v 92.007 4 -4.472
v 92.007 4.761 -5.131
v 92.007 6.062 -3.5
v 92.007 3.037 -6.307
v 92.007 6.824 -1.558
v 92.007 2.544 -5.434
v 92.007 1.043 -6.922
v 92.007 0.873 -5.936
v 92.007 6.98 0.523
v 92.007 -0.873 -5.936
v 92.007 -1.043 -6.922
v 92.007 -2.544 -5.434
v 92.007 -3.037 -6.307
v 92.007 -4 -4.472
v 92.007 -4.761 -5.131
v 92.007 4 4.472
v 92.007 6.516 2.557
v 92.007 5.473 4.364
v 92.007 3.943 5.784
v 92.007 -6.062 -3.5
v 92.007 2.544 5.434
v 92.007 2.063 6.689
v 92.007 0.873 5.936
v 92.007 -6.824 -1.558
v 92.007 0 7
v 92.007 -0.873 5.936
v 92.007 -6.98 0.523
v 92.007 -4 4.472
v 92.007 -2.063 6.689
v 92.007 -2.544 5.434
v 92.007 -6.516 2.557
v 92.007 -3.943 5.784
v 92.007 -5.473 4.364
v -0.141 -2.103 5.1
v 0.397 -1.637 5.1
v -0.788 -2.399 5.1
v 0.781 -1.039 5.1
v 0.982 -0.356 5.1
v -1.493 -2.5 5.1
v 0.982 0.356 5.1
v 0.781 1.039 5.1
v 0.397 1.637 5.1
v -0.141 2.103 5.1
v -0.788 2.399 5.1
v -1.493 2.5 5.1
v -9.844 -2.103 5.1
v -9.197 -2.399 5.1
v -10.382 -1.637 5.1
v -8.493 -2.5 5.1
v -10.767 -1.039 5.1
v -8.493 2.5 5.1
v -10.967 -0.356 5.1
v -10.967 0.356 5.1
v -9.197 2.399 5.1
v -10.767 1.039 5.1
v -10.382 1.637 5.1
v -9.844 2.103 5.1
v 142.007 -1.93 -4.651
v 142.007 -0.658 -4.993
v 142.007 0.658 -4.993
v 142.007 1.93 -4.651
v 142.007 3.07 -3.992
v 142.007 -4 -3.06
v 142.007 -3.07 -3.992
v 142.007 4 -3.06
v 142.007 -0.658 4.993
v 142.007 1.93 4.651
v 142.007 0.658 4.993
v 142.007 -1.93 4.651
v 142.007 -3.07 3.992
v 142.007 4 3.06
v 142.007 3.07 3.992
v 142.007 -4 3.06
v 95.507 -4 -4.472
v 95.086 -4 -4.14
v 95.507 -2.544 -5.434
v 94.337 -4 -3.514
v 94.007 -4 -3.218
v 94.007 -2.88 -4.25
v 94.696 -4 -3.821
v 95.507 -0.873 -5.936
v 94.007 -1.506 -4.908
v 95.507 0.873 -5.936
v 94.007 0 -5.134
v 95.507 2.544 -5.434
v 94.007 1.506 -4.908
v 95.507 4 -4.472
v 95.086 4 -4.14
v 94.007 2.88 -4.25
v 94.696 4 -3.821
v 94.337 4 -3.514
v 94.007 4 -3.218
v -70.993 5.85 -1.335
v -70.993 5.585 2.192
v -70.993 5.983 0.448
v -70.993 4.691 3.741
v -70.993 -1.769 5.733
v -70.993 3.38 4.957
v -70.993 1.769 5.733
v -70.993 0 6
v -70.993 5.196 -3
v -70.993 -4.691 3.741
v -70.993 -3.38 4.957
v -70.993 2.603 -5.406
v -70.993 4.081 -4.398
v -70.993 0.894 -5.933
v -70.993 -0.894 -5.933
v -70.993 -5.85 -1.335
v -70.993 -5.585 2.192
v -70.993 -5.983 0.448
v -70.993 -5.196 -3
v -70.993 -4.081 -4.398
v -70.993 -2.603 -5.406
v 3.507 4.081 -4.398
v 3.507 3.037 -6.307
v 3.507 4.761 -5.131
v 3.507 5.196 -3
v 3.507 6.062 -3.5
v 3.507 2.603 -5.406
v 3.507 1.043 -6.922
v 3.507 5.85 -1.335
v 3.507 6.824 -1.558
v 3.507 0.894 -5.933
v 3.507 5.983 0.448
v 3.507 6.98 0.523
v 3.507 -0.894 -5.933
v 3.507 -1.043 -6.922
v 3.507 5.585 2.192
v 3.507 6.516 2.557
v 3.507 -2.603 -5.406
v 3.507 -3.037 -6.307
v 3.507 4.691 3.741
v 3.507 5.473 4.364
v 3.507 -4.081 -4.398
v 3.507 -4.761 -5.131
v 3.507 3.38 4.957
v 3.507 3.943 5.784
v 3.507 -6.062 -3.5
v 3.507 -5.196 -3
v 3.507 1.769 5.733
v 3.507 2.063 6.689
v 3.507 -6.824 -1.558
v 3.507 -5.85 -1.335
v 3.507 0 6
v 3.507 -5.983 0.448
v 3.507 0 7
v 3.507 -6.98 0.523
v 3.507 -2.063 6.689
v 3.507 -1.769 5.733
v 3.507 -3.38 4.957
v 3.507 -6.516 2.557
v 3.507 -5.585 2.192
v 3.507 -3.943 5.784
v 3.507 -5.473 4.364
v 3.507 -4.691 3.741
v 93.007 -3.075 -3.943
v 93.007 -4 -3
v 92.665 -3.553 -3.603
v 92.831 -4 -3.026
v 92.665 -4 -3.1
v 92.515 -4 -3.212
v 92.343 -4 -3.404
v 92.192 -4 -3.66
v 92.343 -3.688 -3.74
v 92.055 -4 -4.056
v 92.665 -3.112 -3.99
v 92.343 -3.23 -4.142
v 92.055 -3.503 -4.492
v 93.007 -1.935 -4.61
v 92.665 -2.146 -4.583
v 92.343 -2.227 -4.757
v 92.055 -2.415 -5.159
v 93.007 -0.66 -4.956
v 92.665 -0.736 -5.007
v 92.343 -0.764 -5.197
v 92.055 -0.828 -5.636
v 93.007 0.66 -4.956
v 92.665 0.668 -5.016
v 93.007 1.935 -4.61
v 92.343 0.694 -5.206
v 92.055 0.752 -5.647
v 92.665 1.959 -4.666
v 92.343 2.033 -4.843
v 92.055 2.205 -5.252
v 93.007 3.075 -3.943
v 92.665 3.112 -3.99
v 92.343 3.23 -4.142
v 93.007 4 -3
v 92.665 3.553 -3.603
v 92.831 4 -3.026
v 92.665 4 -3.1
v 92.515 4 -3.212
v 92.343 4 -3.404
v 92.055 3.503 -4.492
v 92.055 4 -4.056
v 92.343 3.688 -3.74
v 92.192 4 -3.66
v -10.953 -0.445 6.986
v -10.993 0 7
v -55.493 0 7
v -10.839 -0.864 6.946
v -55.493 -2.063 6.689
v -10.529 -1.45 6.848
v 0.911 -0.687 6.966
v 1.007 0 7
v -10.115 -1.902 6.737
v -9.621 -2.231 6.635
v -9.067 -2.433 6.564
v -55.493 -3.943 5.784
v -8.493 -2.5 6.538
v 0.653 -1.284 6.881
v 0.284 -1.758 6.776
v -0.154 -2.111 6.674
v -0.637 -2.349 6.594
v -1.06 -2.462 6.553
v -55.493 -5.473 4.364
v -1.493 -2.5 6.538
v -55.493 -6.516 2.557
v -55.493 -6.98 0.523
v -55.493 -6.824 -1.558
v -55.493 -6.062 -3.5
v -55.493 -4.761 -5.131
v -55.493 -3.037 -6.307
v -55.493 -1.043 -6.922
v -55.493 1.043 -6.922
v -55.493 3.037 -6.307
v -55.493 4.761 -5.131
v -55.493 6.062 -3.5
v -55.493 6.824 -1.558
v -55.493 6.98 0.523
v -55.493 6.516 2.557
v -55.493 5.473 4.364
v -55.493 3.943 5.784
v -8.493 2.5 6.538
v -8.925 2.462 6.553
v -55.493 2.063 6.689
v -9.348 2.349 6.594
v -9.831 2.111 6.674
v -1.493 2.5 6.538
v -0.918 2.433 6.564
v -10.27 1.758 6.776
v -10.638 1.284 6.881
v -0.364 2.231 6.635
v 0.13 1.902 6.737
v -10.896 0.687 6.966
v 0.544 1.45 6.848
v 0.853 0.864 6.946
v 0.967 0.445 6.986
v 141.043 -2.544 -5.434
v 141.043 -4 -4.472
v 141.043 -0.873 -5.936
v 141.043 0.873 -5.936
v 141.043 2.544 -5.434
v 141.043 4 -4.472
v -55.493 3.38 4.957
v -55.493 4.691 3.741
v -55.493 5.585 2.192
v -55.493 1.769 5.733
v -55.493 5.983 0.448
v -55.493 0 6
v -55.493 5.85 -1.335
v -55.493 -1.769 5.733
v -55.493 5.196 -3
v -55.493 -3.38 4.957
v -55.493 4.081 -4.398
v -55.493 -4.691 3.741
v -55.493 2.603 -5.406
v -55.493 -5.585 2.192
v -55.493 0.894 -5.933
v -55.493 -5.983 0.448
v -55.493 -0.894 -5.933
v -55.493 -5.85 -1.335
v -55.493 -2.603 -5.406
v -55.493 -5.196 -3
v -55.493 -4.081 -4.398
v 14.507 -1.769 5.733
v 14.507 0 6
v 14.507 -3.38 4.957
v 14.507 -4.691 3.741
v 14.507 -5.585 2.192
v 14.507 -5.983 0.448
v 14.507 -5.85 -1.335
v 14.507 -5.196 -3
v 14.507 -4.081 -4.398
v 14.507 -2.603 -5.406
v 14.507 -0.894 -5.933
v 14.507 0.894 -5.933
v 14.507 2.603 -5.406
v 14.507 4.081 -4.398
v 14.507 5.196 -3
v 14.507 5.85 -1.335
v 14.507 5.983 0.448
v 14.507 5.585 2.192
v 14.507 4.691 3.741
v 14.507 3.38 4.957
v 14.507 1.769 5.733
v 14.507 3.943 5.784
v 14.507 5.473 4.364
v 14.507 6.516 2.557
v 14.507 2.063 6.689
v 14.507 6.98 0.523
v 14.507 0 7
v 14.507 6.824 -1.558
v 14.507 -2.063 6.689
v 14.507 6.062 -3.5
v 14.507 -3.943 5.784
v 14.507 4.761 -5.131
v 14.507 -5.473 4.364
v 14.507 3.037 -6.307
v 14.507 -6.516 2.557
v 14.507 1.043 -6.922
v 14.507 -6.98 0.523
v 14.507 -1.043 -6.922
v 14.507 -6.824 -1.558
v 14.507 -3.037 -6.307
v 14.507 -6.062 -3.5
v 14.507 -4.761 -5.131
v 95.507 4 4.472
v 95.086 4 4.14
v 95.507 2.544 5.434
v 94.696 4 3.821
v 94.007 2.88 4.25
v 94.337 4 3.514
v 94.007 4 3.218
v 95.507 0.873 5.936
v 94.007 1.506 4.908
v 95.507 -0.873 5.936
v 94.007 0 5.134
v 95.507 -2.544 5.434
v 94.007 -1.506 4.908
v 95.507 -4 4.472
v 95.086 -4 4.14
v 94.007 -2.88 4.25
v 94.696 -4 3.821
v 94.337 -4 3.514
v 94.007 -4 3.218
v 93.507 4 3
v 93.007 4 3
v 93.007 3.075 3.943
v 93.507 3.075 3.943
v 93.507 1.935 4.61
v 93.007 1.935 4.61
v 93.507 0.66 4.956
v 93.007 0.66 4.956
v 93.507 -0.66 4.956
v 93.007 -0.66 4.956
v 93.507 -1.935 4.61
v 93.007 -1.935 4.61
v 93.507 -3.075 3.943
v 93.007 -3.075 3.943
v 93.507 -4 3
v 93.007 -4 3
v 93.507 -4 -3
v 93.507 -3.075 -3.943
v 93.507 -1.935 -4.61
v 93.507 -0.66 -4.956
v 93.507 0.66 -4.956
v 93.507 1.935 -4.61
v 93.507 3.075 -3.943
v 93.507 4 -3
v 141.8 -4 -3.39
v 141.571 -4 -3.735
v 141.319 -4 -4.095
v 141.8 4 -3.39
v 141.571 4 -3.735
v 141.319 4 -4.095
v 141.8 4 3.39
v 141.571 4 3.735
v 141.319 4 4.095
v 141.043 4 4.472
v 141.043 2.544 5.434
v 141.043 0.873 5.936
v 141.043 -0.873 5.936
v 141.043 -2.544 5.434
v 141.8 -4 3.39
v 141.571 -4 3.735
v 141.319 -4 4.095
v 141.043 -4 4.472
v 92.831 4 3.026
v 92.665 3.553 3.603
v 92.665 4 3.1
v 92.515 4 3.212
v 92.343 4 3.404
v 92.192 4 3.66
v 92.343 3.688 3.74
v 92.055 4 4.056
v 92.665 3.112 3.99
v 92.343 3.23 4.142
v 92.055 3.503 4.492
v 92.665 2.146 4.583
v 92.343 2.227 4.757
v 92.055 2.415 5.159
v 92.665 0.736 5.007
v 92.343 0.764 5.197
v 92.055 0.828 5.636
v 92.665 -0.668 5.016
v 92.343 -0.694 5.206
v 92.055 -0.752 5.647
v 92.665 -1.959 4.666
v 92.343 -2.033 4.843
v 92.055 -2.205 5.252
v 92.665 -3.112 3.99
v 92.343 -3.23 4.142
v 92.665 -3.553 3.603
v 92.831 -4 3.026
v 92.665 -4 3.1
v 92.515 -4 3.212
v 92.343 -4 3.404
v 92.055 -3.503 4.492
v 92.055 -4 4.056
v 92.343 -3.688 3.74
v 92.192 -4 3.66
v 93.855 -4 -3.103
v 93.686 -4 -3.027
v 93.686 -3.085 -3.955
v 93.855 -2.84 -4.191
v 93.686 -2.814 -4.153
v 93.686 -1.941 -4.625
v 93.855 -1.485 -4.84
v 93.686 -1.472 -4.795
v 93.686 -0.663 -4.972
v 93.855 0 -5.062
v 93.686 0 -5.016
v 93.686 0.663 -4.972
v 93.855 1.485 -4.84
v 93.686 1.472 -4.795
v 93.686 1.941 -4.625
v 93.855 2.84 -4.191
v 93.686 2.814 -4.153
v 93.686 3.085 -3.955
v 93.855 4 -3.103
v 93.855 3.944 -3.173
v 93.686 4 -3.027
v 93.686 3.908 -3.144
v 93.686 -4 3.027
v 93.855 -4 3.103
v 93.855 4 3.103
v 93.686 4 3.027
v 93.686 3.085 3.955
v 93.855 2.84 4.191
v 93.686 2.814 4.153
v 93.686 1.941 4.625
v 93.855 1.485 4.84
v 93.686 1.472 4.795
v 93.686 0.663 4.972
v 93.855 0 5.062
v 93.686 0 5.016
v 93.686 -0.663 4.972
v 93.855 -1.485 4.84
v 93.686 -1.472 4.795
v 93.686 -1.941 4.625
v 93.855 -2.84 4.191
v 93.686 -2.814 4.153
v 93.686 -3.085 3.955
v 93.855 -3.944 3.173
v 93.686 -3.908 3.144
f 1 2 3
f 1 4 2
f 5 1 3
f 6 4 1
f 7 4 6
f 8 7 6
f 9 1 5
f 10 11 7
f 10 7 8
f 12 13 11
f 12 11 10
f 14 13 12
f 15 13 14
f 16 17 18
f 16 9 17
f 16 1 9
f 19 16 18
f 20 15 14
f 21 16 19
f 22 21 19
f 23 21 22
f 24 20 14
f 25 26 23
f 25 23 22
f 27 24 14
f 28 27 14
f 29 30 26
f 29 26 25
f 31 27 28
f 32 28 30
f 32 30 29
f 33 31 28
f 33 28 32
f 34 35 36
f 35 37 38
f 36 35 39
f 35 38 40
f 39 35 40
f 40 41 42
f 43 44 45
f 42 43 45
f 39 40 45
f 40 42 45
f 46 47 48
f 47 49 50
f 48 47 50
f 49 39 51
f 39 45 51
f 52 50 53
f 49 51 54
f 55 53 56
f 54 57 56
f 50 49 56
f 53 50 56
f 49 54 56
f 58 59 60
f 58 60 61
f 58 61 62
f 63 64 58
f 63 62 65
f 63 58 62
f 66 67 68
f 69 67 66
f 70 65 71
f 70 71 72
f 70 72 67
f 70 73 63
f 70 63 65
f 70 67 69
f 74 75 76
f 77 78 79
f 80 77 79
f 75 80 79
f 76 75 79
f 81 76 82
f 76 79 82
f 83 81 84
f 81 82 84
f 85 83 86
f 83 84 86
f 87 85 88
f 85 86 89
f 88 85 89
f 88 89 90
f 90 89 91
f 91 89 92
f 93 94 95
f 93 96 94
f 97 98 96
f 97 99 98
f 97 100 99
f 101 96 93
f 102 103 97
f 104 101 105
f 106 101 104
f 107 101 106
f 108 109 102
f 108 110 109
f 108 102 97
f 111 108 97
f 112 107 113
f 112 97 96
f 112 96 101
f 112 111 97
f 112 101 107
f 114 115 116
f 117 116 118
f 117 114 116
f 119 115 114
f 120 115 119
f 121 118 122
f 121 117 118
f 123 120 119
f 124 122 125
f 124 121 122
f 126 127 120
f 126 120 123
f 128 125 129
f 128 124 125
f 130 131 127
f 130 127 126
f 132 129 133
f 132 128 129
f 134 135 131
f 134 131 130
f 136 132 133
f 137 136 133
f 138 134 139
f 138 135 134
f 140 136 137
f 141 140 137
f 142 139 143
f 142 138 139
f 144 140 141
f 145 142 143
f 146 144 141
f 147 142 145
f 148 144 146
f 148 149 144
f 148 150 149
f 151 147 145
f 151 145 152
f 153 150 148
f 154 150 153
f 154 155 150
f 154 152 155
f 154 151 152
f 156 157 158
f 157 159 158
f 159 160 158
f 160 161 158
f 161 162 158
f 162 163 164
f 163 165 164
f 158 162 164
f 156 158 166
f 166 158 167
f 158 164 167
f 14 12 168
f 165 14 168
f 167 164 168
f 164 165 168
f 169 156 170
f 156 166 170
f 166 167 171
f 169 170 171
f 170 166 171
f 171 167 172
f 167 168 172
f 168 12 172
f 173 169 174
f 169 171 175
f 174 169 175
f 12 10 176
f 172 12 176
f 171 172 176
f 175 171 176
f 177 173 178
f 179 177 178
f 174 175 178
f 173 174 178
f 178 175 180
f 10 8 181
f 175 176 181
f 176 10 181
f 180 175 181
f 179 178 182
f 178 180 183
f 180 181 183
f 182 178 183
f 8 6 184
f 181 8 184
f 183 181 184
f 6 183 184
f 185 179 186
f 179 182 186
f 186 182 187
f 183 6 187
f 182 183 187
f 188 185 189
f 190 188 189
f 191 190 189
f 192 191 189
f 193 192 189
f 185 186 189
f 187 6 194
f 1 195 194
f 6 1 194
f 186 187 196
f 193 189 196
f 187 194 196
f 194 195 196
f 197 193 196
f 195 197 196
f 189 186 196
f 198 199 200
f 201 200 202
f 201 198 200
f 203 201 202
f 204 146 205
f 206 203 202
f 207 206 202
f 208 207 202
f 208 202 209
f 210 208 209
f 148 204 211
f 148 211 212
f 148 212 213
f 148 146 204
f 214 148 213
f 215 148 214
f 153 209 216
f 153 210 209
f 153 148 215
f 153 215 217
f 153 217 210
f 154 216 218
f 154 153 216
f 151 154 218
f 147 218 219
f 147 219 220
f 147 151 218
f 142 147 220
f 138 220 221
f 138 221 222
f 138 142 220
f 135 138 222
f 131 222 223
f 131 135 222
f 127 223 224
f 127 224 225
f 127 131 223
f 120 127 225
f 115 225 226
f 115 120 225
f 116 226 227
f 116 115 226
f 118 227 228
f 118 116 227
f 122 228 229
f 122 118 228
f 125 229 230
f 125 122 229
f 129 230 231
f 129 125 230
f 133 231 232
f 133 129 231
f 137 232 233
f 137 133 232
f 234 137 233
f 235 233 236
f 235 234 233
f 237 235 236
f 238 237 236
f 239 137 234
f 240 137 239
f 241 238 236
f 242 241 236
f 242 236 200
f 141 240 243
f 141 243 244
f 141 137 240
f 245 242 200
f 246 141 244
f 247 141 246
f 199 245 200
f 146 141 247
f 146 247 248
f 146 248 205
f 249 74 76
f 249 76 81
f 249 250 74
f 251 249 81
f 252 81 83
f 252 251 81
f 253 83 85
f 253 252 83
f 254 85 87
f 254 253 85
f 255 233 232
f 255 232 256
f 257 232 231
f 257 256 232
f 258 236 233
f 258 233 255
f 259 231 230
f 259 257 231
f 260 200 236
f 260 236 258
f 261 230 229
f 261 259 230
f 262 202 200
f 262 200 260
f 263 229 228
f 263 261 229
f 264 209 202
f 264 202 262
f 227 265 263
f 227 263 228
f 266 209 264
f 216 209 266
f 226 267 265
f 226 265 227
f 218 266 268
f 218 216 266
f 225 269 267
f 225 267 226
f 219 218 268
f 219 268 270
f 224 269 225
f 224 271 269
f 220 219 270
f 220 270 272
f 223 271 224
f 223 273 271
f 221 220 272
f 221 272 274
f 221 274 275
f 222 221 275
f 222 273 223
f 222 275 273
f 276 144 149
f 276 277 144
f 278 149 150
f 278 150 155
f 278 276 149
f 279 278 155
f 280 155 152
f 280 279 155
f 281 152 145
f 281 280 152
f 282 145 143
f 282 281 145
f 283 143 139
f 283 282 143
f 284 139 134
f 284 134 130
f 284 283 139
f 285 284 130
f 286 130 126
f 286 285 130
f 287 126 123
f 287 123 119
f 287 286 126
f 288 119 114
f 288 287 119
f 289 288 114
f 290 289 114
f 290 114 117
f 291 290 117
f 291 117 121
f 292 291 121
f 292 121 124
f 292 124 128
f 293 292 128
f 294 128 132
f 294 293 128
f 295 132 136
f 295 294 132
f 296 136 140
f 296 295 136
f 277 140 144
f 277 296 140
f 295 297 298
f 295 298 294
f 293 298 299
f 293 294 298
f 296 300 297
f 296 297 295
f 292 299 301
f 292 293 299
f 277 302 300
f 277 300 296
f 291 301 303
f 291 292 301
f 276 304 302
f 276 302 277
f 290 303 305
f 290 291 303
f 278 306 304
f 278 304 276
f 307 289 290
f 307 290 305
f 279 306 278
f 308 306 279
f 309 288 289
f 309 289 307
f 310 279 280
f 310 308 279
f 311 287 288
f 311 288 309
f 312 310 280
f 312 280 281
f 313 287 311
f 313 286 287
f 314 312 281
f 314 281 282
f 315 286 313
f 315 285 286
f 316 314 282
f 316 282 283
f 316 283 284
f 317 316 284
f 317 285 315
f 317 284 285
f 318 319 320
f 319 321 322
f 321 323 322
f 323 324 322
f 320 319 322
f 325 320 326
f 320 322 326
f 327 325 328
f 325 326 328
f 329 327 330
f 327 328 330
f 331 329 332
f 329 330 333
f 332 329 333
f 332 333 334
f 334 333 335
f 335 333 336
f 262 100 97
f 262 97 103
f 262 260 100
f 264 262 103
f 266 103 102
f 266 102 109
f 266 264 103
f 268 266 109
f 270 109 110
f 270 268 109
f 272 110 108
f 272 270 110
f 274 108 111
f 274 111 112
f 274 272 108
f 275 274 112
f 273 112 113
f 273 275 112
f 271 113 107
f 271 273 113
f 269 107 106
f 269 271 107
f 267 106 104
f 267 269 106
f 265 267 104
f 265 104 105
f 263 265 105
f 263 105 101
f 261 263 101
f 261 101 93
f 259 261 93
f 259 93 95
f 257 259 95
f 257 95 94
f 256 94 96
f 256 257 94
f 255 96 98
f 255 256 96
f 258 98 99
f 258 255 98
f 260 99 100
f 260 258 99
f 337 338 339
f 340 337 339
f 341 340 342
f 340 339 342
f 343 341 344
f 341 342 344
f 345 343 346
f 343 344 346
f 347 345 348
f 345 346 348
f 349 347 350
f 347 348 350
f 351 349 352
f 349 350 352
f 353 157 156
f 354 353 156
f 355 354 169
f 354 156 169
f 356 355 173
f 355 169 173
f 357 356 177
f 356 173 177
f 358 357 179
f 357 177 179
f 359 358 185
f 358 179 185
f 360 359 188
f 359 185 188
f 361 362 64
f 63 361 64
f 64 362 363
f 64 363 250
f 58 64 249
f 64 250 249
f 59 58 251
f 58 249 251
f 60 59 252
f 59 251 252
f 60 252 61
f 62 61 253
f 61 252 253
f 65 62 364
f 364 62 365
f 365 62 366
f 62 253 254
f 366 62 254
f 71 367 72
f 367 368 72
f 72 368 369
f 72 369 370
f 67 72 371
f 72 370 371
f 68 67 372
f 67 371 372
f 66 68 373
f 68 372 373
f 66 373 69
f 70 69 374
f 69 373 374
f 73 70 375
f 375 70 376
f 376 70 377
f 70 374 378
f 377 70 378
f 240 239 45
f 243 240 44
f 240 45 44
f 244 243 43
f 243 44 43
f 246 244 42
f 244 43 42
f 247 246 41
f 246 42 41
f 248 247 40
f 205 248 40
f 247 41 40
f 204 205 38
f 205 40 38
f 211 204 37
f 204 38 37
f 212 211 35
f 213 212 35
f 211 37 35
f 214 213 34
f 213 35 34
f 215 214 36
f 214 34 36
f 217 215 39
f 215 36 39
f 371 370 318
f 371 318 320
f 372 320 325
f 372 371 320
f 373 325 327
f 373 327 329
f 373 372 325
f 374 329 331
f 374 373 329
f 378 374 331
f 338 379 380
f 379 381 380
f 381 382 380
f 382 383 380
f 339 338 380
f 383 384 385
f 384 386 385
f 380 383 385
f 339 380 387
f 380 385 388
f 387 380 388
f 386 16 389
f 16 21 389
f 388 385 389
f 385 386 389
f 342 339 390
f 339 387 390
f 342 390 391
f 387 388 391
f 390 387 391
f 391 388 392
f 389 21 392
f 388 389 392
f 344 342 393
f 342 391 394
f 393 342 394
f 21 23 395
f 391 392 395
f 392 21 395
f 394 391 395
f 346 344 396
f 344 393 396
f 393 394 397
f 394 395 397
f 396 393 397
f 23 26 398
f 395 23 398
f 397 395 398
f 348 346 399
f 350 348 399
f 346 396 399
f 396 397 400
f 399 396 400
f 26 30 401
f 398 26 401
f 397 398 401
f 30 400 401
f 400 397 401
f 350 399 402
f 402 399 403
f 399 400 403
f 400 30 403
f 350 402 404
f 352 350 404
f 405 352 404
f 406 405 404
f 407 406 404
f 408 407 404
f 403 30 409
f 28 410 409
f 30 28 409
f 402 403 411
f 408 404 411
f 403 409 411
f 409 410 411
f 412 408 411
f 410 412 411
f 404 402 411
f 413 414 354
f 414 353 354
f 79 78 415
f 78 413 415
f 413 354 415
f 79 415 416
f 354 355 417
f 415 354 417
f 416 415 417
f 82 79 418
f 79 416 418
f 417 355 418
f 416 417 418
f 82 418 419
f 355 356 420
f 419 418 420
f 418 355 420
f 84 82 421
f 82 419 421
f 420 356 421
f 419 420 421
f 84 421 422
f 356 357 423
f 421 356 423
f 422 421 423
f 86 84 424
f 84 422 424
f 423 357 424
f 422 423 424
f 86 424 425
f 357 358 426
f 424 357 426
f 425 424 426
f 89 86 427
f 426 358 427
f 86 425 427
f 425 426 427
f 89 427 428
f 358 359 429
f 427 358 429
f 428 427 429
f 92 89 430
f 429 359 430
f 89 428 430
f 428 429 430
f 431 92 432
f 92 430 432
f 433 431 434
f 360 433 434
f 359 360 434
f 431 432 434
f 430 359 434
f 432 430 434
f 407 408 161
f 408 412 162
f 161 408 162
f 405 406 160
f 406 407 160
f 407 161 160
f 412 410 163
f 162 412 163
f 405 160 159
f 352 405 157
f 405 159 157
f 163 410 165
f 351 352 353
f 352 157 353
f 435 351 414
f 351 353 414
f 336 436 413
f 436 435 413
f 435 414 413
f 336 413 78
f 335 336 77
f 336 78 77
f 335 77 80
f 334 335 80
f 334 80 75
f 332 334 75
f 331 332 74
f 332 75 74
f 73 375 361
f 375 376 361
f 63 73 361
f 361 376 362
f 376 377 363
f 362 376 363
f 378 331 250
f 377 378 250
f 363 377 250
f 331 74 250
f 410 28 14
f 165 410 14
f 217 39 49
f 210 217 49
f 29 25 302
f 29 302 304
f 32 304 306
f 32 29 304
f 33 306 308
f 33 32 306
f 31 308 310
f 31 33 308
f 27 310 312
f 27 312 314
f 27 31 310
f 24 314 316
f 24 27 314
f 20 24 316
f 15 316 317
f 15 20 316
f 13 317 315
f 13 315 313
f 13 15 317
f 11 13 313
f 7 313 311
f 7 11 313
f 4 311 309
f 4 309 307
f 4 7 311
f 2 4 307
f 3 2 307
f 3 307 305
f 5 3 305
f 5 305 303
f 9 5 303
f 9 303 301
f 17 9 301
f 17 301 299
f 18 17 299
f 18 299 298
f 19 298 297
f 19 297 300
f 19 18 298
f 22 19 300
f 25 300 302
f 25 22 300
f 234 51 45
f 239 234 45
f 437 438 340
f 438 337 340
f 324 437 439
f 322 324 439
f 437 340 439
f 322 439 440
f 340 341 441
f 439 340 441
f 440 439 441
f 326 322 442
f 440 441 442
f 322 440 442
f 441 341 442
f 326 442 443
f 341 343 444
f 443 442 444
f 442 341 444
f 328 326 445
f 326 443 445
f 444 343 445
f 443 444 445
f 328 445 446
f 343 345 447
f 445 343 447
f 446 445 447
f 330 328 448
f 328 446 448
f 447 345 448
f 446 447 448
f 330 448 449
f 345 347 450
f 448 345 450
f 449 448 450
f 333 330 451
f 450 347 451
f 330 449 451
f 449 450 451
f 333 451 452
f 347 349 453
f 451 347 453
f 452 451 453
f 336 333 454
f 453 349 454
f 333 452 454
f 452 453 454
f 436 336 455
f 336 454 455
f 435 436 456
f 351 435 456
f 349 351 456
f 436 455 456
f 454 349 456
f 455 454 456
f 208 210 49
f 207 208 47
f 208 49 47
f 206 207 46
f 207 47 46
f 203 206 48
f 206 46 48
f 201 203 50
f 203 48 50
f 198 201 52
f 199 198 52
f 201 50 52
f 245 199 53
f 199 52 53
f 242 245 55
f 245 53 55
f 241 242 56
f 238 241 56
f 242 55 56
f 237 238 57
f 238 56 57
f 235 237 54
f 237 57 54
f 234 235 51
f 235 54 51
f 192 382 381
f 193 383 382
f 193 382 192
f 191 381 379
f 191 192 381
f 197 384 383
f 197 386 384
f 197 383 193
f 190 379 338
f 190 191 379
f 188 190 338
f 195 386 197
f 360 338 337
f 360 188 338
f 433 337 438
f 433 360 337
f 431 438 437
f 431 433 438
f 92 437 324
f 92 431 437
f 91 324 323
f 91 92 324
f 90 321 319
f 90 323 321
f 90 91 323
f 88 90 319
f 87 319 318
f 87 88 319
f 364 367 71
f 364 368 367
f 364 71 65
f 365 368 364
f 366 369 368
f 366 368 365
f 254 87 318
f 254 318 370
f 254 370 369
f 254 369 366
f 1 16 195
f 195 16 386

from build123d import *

# Parameters (mm, degrees)
SCHNITT_LINEAR_AUSTRAGEN1_DEPTH      = 143.352054199
SCHNITT_LINEAR_AUSTRAGEN1_DEPTH_BACK = 143.352054199
SKIZZE4_W                            = 80.01116069
SKIZZE4_H                            = 4.996766738
SCHNITT_LINEAR_AUSTRAGEN2_DEPTH      = 143.867446828
SCHNITT_LINEAR_AUSTRAGEN2_DEPTH_BACK = 1.9


# Read off the part's stored shape, not the designer's step: M12 Maschinengewinde Bolzen1
with BuildPart() as part:
    # Skizze2 → Rotation1 (revolve)
    with BuildSketch(Plane.XY, mode=Mode.PRIVATE) as rotation1_sk:
        Polygon((-70.992580001, 0), (-70.992580001, 6), (-55.492580001, 6), (-55.492580001, 7), (3.507419999, 7), (3.507419999, 6), (14.507419999, 6), (14.507419999, 7), (92.007419999, 7), (92.007419999, 6), (142.007419999, 6), (142.007419999, 0), align=None)
    revolve(rotation1_sk.sketch.rotate(Axis((-31.289719626, 0, 0), (1, 0, 0)), 90), axis=Axis((-31.289719626, 0, 0), (1, 0, 0)))

    # M12 Maschinengewinde Bolzen1 outline → M12 Maschinengewinde Bolzen1 (revolve, cut)
    with BuildSketch(Plane.YX):
        with BuildLine():
            Line((6, 95.507419999), (5.133974596, 94.007419999))
            ThreePointArc((5.133974596, 94.007419999), (5.034074174, 93.766239044), (5, 93.507419999))
            Line((5, 93.507419999), (5, 93.007419999))
            ThreePointArc((5, 93.007419999), (5.292893219, 92.300313218), (6, 92.007419999))
            Line((6, 92.007419999), (6, 95.507419999))
        make_face()
        Polygon((5.036, 142.007419999), (6, 141.043419999), (6, 142.007419999), align=None)
    revolve(axis=Axis((0, 0, 0), (1, 0, 0)), mode=Mode.SUBTRACT)

    # Skizze4 → Schnitt-Linear austragen1 (cut, two sides: drawn at the far end of the back side and taken through both)
    with BuildSketch(Plane.XY.offset(-SCHNITT_LINEAR_AUSTRAGEN1_DEPTH_BACK)):
        with Locations((132.013000344, 6.498383369)):
            Rectangle(SKIZZE4_W, SKIZZE4_H)
        with Locations((132.013000344, -6.498383369)):
            Rectangle(SKIZZE4_W, SKIZZE4_H)
    extrude(amount=SCHNITT_LINEAR_AUSTRAGEN1_DEPTH + SCHNITT_LINEAR_AUSTRAGEN1_DEPTH_BACK, mode=Mode.SUBTRACT)

    # Skizze5 → Schnitt-Linear austragen2 (cut, two sides: drawn at the far end of the back side and taken through both)
    with BuildSketch(Plane.XY.offset(7).offset(-SCHNITT_LINEAR_AUSTRAGEN2_DEPTH_BACK)):
        with BuildLine():
            Line((-1.492580001, -2.5), (-8.492580001, -2.5))
            ThreePointArc((-8.492580001, -2.5), (-10.992580001, 0), (-8.492580001, 2.5))
            Line((-8.492580001, 2.5), (-1.492580001, 2.5))
            ThreePointArc((-1.492580001, 2.5), (1.007419999, 0), (-1.492580001, -2.5))
        make_face()
    extrude(amount=SCHNITT_LINEAR_AUSTRAGEN2_DEPTH + SCHNITT_LINEAR_AUSTRAGEN2_DEPTH_BACK, mode=Mode.SUBTRACT)


solid = part.part
